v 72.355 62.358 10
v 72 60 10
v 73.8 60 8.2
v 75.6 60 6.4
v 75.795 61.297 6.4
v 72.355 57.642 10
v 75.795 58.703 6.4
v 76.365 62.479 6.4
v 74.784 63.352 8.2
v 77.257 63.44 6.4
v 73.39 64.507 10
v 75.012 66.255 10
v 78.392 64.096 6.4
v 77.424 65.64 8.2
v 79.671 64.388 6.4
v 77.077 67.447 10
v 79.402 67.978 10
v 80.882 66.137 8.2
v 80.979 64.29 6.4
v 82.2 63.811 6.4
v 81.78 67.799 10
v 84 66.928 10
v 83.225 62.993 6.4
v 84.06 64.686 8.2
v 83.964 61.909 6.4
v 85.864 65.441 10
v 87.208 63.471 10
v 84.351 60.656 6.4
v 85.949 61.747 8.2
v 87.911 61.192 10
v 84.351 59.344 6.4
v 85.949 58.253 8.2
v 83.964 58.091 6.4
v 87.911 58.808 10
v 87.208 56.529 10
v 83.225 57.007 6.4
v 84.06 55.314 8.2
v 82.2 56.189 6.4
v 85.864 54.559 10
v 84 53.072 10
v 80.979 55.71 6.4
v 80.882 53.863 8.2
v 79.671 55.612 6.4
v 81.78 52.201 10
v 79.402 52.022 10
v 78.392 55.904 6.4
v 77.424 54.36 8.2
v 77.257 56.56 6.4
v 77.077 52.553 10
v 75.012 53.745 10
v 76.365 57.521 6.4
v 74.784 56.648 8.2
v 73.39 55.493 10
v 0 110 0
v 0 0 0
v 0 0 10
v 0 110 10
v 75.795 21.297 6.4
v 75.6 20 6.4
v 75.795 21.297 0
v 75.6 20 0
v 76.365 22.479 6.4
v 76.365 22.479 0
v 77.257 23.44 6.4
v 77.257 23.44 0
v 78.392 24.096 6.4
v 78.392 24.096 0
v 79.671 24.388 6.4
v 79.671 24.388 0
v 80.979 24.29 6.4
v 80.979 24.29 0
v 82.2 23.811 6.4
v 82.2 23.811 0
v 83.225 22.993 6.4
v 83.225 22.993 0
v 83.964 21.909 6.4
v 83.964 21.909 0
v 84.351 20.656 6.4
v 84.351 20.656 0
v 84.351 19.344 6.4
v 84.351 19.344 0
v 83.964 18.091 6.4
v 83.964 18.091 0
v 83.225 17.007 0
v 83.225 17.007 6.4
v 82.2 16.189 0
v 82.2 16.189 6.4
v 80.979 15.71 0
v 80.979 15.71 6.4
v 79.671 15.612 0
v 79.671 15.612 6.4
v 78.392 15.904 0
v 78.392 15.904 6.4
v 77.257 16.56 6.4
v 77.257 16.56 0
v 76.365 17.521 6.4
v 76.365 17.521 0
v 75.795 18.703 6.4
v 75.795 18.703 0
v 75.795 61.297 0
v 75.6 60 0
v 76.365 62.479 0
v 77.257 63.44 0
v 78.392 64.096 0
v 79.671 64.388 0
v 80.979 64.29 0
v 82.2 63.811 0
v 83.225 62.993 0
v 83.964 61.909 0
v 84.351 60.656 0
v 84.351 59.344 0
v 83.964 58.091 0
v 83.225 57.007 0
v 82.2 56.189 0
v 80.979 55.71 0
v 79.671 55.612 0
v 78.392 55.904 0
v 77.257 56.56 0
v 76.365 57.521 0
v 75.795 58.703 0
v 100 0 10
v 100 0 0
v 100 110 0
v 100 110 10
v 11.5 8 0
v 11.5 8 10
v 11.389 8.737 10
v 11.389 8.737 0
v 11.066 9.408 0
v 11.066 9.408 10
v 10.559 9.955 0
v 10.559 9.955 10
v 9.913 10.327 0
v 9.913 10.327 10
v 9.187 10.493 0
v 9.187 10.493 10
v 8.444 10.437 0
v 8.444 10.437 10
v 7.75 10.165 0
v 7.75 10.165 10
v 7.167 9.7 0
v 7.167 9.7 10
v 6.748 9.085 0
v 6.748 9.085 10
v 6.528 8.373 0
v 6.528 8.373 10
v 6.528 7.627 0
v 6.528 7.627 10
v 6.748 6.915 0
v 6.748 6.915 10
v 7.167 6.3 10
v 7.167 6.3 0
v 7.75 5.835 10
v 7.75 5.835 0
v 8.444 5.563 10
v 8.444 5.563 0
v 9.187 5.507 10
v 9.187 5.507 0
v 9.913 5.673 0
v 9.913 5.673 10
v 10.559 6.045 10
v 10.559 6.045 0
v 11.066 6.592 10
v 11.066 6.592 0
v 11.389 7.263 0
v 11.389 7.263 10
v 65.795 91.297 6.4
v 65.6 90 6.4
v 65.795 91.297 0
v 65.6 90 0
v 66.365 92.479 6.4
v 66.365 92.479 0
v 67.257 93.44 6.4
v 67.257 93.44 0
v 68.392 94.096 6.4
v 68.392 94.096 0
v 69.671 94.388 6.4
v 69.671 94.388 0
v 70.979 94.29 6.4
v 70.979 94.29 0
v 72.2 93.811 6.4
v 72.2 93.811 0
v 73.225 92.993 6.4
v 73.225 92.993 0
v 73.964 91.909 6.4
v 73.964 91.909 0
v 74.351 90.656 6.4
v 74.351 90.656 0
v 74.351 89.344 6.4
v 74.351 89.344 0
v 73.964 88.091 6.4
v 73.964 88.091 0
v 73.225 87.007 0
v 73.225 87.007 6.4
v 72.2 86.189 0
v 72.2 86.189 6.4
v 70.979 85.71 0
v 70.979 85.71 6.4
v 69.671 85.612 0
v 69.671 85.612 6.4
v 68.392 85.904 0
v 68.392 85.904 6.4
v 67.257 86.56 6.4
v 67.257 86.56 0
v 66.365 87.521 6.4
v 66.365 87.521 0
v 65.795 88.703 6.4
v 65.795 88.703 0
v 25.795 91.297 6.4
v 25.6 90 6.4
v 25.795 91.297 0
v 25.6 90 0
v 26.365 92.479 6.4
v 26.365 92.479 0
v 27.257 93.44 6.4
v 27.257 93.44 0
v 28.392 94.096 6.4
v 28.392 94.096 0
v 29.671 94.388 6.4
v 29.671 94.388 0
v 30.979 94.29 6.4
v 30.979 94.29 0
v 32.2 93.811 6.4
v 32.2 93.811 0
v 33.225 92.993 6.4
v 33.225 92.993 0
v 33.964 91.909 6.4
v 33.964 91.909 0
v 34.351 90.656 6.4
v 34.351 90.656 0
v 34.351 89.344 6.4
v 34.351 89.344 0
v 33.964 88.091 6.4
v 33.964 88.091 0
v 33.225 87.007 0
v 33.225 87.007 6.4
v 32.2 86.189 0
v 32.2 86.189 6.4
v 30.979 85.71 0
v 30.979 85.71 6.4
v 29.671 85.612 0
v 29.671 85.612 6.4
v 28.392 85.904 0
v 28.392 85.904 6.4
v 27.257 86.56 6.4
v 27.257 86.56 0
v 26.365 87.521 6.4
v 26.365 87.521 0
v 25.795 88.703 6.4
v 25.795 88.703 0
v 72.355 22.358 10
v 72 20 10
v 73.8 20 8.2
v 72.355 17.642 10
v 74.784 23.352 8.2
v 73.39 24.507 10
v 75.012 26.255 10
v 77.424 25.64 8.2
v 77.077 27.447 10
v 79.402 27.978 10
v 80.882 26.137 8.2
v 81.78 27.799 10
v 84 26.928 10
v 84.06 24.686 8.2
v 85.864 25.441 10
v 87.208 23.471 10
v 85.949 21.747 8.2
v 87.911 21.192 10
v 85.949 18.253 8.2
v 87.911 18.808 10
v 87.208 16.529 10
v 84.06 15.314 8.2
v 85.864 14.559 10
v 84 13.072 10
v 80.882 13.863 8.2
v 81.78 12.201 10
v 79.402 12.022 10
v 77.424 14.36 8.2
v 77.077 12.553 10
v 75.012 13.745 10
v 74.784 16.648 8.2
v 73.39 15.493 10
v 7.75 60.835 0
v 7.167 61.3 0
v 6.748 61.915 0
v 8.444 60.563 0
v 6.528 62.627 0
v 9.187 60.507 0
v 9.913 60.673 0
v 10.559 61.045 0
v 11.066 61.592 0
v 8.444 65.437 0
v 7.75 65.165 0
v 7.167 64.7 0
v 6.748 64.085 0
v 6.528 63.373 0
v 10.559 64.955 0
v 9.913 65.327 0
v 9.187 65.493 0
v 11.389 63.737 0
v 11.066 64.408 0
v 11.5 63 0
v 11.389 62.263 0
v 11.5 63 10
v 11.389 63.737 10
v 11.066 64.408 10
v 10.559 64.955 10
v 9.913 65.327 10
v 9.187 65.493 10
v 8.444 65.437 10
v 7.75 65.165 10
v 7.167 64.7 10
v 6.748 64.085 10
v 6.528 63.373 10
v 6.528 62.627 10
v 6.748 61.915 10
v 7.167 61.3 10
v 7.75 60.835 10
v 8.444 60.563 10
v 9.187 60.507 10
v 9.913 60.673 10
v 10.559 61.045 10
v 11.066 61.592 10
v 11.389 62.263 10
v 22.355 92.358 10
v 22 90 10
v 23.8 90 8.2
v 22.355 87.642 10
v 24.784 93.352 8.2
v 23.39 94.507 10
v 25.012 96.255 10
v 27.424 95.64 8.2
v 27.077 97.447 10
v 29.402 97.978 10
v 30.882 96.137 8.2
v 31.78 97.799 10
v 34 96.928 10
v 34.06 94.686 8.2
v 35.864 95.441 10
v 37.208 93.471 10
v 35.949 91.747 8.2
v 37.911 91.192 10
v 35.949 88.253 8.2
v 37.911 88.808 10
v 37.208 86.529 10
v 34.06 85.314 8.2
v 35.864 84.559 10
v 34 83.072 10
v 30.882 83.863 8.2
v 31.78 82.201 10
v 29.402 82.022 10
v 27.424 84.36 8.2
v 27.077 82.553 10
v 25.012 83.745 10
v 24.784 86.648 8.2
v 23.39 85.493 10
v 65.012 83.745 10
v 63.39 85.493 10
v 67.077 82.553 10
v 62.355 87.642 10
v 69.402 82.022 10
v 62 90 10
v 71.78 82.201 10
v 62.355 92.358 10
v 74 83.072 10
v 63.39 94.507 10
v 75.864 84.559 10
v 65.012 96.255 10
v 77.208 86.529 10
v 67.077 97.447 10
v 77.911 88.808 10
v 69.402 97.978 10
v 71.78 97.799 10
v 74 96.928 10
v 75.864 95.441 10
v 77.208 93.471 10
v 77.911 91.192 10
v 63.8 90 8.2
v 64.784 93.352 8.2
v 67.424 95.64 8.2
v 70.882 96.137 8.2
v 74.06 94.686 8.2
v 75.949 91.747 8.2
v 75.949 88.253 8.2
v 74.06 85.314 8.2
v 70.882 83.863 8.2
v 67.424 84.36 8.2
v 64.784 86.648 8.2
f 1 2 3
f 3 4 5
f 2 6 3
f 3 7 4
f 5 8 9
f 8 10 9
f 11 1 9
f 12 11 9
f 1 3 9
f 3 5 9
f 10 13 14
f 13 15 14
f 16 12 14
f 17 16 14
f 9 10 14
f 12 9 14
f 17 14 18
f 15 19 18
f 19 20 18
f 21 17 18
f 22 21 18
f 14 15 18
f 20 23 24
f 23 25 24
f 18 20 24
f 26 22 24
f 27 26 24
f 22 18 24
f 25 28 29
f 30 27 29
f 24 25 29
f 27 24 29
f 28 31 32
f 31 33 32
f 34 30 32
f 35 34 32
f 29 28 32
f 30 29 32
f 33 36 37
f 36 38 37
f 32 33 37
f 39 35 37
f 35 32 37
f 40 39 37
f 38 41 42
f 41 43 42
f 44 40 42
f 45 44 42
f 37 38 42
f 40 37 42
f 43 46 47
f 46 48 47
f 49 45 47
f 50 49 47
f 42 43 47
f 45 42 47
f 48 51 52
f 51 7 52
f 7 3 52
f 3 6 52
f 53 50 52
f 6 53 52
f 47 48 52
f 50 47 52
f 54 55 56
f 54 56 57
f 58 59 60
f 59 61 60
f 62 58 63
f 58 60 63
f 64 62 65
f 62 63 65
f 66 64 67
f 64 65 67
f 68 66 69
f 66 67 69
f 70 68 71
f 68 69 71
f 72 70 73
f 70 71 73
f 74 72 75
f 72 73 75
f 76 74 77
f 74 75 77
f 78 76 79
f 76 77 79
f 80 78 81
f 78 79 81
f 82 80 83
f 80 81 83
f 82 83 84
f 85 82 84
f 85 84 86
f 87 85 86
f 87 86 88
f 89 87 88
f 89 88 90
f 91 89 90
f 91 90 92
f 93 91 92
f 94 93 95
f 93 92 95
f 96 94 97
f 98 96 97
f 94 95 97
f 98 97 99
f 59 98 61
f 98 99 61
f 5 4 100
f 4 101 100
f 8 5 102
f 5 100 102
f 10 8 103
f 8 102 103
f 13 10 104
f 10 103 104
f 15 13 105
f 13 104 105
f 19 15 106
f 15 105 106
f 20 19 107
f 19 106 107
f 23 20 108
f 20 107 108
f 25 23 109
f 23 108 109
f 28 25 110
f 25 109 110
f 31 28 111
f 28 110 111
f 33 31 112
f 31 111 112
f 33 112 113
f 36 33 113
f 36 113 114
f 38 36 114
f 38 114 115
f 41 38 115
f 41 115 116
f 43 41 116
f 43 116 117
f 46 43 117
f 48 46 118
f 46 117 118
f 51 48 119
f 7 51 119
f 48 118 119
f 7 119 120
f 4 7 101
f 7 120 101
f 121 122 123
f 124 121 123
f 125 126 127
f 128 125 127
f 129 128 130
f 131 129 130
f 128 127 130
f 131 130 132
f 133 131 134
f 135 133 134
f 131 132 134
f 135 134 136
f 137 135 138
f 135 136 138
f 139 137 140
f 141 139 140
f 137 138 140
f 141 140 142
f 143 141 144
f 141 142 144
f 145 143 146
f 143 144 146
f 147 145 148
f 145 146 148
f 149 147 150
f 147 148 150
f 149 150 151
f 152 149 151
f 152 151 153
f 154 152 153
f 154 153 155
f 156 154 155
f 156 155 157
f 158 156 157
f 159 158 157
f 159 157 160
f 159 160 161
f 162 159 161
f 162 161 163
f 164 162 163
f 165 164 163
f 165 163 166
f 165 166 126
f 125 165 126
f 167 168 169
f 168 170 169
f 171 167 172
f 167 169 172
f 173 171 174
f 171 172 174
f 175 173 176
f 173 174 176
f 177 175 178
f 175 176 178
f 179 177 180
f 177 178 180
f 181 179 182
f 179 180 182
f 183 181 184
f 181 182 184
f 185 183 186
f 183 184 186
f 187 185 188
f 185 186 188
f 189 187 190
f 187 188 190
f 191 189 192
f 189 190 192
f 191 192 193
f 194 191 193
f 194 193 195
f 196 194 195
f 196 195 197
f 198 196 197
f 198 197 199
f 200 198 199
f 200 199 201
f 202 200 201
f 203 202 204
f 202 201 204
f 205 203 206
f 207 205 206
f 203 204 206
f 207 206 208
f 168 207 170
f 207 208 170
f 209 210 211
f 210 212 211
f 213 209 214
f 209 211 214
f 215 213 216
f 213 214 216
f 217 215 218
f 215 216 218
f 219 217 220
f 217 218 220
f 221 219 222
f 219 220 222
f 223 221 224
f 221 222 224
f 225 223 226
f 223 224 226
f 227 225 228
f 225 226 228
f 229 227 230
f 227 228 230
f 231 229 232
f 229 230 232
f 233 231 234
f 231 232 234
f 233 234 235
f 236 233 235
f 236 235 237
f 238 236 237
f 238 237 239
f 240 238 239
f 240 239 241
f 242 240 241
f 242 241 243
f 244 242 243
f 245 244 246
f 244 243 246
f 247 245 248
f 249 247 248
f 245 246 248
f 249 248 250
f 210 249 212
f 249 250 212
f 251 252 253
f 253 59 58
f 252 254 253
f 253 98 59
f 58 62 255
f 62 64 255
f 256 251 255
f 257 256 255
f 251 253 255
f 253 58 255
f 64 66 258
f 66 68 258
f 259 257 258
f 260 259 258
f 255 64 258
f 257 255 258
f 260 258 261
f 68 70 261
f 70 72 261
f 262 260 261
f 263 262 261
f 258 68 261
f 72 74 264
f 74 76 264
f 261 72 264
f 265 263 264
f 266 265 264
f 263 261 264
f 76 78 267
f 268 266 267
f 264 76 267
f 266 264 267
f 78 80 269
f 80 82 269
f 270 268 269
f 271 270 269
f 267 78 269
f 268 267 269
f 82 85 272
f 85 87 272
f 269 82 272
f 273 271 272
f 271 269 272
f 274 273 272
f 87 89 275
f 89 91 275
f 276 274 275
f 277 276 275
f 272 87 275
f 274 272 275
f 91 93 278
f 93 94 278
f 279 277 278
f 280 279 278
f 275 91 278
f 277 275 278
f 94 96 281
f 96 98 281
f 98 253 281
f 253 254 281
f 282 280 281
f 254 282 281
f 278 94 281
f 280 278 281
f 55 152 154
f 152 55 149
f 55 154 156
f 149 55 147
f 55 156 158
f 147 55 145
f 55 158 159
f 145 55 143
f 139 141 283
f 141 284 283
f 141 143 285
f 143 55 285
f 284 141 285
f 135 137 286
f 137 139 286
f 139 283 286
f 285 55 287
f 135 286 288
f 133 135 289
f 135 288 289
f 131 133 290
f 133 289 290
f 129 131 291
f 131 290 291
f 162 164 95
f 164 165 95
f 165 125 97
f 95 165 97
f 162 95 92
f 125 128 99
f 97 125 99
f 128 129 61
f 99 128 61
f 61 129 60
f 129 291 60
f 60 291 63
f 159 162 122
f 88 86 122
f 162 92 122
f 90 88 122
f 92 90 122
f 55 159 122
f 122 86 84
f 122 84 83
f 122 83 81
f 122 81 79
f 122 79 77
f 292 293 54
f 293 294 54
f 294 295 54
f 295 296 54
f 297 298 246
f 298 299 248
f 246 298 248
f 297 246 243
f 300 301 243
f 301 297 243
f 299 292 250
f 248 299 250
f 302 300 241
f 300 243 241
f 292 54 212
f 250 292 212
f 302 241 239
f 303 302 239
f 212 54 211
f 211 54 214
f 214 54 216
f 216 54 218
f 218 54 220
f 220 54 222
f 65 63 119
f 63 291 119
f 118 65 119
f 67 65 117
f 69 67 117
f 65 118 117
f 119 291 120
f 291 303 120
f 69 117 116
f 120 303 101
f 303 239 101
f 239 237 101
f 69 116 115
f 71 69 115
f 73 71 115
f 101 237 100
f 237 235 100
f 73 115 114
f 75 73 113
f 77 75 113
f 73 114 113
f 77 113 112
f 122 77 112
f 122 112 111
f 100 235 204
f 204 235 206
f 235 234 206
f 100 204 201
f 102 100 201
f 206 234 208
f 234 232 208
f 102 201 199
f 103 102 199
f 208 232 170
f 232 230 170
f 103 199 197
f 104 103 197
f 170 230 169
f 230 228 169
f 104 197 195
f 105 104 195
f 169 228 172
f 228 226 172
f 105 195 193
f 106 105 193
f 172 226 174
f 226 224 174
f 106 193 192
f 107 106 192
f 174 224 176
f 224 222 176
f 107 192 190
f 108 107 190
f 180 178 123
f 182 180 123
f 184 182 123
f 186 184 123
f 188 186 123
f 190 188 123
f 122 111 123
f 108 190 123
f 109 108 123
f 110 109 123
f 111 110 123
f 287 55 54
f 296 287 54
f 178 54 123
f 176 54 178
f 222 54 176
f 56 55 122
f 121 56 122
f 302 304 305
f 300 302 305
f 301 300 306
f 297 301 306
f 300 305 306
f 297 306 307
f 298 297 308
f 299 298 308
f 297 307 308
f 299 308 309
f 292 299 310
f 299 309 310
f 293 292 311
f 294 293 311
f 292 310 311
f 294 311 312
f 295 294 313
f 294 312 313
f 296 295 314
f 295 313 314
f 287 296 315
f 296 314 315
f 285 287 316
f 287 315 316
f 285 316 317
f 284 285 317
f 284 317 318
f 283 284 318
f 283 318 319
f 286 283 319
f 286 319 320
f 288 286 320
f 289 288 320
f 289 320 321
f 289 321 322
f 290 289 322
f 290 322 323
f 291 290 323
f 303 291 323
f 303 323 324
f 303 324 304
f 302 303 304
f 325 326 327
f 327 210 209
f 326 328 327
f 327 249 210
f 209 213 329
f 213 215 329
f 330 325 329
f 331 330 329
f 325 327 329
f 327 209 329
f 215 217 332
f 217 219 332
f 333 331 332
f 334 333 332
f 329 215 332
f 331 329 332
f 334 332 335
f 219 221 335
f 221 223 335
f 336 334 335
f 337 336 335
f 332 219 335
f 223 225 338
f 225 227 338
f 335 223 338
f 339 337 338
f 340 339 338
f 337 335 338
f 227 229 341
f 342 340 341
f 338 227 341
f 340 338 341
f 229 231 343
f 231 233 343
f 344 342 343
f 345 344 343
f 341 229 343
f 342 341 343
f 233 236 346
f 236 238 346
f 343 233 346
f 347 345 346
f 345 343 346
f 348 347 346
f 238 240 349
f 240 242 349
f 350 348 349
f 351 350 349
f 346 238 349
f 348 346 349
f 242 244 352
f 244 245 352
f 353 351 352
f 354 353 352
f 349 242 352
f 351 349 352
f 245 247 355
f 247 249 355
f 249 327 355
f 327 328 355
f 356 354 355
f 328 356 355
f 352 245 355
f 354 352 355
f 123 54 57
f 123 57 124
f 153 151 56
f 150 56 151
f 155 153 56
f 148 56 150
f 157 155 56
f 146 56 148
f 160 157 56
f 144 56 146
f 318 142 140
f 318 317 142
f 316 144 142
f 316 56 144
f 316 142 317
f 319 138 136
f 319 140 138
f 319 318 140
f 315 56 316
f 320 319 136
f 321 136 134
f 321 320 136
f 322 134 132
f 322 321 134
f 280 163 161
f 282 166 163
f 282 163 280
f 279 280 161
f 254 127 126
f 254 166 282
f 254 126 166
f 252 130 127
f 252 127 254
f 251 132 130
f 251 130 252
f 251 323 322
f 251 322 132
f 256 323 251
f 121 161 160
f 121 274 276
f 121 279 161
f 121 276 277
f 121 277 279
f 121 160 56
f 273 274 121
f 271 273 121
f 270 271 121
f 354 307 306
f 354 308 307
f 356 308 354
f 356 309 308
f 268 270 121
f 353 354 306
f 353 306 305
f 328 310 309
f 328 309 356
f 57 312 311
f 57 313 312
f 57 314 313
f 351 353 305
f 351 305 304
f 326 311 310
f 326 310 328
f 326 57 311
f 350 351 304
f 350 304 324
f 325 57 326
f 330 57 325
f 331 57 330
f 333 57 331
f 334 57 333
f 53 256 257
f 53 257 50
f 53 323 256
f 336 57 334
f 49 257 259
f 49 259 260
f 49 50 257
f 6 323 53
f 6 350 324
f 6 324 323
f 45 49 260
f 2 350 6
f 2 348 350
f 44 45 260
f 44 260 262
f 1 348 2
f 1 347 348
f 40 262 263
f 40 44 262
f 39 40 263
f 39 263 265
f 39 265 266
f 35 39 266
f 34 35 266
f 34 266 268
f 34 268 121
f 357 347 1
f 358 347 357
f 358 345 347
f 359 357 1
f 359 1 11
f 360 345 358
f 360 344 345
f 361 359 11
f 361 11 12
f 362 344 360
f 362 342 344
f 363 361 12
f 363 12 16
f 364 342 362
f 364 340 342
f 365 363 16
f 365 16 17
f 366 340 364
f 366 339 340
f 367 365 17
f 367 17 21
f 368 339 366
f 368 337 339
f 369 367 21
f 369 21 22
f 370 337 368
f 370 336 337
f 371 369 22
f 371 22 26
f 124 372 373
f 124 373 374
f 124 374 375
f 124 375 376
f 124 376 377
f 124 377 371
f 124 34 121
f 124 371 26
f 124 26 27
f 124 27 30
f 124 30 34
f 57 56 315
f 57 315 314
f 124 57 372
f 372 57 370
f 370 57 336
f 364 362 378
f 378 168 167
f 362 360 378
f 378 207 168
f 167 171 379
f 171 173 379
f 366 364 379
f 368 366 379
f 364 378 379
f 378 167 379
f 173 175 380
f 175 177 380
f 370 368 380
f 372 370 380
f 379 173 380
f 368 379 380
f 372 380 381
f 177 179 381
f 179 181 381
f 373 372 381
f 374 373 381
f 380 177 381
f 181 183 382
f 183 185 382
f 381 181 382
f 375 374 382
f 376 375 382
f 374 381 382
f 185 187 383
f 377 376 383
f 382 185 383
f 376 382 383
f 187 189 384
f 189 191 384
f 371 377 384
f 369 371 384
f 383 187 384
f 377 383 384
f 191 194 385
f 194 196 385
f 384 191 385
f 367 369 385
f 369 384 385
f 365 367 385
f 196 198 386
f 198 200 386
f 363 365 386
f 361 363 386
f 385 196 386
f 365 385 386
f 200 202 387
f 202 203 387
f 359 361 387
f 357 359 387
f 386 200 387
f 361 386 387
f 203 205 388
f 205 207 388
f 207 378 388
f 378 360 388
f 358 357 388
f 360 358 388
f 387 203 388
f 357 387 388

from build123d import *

# Parameters (mm, degrees)
SKETCH_W               = 100
SKETCH_H               = 110
PAD_DEPTH              = 10
SKETCH001_R            = 2.5
HOLE_DEPTH             = 10.001
LINEARPATTERN_COUNT    = 2
LINEARPATTERN_PITCH    = 55
HOLE001_D              = 8.8
HOLE001_CSINK_D        = 16
HOLE001_CSINK_ANGLE    = 90
LINEARPATTERN001_COUNT = 2
LINEARPATTERN001_PITCH = 40
HOLE002_D              = 8.8
HOLE002_CSINK_D        = 16
HOLE002_CSINK_ANGLE    = 90
LINEARPATTERN002_COUNT = 2
LINEARPATTERN002_PITCH = 40


with BuildPart() as part:
    # Sketch → Pad (new body)
    with BuildSketch(Plane.XY):
        with Locations((50, 55)):
            Rectangle(SKETCH_W, SKETCH_H)
    extrude(amount=PAD_DEPTH)

    # Sketch001 (on Face6 of Pad) → Hole (cut, through all)
    with BuildSketch(Plane.XY.offset(10)):
        with Locations((9, 8)):
            Circle(SKETCH001_R)
    hole = extrude(amount=-HOLE_DEPTH, mode=Mode.SUBTRACT)

    # LinearPattern: Hole ×2
    with Locations(*[(0, i * LINEARPATTERN_PITCH, 0) for i in range(1, LINEARPATTERN_COUNT)]):
        add(hole, mode=Mode.SUBTRACT)

    # Hole001 (through all)
    with Locations(Plane.XY.offset(10)):
        with Locations((80, 20)):
            hole001 = CounterSinkHole(HOLE001_D / 2, HOLE001_CSINK_D / 2, counter_sink_angle=HOLE001_CSINK_ANGLE)

    # LinearPattern001: Hole001 ×2
    with Locations(*[(0, i * LINEARPATTERN001_PITCH, 0) for i in range(1, LINEARPATTERN001_COUNT)]):
        add(hole001, mode=Mode.SUBTRACT)

    # Hole002 (through all)
    with Locations(Plane.XY.offset(10)):
        with Locations((30, 90)):
            hole002 = CounterSinkHole(HOLE002_D / 2, HOLE002_CSINK_D / 2, counter_sink_angle=HOLE002_CSINK_ANGLE)

    # LinearPattern002: Hole002 ×2
    with Locations(*[(i * LINEARPATTERN002_PITCH, 0, 0) for i in range(1, LINEARPATTERN002_COUNT)]):
        add(hole002, mode=Mode.SUBTRACT)


solid = part.part
